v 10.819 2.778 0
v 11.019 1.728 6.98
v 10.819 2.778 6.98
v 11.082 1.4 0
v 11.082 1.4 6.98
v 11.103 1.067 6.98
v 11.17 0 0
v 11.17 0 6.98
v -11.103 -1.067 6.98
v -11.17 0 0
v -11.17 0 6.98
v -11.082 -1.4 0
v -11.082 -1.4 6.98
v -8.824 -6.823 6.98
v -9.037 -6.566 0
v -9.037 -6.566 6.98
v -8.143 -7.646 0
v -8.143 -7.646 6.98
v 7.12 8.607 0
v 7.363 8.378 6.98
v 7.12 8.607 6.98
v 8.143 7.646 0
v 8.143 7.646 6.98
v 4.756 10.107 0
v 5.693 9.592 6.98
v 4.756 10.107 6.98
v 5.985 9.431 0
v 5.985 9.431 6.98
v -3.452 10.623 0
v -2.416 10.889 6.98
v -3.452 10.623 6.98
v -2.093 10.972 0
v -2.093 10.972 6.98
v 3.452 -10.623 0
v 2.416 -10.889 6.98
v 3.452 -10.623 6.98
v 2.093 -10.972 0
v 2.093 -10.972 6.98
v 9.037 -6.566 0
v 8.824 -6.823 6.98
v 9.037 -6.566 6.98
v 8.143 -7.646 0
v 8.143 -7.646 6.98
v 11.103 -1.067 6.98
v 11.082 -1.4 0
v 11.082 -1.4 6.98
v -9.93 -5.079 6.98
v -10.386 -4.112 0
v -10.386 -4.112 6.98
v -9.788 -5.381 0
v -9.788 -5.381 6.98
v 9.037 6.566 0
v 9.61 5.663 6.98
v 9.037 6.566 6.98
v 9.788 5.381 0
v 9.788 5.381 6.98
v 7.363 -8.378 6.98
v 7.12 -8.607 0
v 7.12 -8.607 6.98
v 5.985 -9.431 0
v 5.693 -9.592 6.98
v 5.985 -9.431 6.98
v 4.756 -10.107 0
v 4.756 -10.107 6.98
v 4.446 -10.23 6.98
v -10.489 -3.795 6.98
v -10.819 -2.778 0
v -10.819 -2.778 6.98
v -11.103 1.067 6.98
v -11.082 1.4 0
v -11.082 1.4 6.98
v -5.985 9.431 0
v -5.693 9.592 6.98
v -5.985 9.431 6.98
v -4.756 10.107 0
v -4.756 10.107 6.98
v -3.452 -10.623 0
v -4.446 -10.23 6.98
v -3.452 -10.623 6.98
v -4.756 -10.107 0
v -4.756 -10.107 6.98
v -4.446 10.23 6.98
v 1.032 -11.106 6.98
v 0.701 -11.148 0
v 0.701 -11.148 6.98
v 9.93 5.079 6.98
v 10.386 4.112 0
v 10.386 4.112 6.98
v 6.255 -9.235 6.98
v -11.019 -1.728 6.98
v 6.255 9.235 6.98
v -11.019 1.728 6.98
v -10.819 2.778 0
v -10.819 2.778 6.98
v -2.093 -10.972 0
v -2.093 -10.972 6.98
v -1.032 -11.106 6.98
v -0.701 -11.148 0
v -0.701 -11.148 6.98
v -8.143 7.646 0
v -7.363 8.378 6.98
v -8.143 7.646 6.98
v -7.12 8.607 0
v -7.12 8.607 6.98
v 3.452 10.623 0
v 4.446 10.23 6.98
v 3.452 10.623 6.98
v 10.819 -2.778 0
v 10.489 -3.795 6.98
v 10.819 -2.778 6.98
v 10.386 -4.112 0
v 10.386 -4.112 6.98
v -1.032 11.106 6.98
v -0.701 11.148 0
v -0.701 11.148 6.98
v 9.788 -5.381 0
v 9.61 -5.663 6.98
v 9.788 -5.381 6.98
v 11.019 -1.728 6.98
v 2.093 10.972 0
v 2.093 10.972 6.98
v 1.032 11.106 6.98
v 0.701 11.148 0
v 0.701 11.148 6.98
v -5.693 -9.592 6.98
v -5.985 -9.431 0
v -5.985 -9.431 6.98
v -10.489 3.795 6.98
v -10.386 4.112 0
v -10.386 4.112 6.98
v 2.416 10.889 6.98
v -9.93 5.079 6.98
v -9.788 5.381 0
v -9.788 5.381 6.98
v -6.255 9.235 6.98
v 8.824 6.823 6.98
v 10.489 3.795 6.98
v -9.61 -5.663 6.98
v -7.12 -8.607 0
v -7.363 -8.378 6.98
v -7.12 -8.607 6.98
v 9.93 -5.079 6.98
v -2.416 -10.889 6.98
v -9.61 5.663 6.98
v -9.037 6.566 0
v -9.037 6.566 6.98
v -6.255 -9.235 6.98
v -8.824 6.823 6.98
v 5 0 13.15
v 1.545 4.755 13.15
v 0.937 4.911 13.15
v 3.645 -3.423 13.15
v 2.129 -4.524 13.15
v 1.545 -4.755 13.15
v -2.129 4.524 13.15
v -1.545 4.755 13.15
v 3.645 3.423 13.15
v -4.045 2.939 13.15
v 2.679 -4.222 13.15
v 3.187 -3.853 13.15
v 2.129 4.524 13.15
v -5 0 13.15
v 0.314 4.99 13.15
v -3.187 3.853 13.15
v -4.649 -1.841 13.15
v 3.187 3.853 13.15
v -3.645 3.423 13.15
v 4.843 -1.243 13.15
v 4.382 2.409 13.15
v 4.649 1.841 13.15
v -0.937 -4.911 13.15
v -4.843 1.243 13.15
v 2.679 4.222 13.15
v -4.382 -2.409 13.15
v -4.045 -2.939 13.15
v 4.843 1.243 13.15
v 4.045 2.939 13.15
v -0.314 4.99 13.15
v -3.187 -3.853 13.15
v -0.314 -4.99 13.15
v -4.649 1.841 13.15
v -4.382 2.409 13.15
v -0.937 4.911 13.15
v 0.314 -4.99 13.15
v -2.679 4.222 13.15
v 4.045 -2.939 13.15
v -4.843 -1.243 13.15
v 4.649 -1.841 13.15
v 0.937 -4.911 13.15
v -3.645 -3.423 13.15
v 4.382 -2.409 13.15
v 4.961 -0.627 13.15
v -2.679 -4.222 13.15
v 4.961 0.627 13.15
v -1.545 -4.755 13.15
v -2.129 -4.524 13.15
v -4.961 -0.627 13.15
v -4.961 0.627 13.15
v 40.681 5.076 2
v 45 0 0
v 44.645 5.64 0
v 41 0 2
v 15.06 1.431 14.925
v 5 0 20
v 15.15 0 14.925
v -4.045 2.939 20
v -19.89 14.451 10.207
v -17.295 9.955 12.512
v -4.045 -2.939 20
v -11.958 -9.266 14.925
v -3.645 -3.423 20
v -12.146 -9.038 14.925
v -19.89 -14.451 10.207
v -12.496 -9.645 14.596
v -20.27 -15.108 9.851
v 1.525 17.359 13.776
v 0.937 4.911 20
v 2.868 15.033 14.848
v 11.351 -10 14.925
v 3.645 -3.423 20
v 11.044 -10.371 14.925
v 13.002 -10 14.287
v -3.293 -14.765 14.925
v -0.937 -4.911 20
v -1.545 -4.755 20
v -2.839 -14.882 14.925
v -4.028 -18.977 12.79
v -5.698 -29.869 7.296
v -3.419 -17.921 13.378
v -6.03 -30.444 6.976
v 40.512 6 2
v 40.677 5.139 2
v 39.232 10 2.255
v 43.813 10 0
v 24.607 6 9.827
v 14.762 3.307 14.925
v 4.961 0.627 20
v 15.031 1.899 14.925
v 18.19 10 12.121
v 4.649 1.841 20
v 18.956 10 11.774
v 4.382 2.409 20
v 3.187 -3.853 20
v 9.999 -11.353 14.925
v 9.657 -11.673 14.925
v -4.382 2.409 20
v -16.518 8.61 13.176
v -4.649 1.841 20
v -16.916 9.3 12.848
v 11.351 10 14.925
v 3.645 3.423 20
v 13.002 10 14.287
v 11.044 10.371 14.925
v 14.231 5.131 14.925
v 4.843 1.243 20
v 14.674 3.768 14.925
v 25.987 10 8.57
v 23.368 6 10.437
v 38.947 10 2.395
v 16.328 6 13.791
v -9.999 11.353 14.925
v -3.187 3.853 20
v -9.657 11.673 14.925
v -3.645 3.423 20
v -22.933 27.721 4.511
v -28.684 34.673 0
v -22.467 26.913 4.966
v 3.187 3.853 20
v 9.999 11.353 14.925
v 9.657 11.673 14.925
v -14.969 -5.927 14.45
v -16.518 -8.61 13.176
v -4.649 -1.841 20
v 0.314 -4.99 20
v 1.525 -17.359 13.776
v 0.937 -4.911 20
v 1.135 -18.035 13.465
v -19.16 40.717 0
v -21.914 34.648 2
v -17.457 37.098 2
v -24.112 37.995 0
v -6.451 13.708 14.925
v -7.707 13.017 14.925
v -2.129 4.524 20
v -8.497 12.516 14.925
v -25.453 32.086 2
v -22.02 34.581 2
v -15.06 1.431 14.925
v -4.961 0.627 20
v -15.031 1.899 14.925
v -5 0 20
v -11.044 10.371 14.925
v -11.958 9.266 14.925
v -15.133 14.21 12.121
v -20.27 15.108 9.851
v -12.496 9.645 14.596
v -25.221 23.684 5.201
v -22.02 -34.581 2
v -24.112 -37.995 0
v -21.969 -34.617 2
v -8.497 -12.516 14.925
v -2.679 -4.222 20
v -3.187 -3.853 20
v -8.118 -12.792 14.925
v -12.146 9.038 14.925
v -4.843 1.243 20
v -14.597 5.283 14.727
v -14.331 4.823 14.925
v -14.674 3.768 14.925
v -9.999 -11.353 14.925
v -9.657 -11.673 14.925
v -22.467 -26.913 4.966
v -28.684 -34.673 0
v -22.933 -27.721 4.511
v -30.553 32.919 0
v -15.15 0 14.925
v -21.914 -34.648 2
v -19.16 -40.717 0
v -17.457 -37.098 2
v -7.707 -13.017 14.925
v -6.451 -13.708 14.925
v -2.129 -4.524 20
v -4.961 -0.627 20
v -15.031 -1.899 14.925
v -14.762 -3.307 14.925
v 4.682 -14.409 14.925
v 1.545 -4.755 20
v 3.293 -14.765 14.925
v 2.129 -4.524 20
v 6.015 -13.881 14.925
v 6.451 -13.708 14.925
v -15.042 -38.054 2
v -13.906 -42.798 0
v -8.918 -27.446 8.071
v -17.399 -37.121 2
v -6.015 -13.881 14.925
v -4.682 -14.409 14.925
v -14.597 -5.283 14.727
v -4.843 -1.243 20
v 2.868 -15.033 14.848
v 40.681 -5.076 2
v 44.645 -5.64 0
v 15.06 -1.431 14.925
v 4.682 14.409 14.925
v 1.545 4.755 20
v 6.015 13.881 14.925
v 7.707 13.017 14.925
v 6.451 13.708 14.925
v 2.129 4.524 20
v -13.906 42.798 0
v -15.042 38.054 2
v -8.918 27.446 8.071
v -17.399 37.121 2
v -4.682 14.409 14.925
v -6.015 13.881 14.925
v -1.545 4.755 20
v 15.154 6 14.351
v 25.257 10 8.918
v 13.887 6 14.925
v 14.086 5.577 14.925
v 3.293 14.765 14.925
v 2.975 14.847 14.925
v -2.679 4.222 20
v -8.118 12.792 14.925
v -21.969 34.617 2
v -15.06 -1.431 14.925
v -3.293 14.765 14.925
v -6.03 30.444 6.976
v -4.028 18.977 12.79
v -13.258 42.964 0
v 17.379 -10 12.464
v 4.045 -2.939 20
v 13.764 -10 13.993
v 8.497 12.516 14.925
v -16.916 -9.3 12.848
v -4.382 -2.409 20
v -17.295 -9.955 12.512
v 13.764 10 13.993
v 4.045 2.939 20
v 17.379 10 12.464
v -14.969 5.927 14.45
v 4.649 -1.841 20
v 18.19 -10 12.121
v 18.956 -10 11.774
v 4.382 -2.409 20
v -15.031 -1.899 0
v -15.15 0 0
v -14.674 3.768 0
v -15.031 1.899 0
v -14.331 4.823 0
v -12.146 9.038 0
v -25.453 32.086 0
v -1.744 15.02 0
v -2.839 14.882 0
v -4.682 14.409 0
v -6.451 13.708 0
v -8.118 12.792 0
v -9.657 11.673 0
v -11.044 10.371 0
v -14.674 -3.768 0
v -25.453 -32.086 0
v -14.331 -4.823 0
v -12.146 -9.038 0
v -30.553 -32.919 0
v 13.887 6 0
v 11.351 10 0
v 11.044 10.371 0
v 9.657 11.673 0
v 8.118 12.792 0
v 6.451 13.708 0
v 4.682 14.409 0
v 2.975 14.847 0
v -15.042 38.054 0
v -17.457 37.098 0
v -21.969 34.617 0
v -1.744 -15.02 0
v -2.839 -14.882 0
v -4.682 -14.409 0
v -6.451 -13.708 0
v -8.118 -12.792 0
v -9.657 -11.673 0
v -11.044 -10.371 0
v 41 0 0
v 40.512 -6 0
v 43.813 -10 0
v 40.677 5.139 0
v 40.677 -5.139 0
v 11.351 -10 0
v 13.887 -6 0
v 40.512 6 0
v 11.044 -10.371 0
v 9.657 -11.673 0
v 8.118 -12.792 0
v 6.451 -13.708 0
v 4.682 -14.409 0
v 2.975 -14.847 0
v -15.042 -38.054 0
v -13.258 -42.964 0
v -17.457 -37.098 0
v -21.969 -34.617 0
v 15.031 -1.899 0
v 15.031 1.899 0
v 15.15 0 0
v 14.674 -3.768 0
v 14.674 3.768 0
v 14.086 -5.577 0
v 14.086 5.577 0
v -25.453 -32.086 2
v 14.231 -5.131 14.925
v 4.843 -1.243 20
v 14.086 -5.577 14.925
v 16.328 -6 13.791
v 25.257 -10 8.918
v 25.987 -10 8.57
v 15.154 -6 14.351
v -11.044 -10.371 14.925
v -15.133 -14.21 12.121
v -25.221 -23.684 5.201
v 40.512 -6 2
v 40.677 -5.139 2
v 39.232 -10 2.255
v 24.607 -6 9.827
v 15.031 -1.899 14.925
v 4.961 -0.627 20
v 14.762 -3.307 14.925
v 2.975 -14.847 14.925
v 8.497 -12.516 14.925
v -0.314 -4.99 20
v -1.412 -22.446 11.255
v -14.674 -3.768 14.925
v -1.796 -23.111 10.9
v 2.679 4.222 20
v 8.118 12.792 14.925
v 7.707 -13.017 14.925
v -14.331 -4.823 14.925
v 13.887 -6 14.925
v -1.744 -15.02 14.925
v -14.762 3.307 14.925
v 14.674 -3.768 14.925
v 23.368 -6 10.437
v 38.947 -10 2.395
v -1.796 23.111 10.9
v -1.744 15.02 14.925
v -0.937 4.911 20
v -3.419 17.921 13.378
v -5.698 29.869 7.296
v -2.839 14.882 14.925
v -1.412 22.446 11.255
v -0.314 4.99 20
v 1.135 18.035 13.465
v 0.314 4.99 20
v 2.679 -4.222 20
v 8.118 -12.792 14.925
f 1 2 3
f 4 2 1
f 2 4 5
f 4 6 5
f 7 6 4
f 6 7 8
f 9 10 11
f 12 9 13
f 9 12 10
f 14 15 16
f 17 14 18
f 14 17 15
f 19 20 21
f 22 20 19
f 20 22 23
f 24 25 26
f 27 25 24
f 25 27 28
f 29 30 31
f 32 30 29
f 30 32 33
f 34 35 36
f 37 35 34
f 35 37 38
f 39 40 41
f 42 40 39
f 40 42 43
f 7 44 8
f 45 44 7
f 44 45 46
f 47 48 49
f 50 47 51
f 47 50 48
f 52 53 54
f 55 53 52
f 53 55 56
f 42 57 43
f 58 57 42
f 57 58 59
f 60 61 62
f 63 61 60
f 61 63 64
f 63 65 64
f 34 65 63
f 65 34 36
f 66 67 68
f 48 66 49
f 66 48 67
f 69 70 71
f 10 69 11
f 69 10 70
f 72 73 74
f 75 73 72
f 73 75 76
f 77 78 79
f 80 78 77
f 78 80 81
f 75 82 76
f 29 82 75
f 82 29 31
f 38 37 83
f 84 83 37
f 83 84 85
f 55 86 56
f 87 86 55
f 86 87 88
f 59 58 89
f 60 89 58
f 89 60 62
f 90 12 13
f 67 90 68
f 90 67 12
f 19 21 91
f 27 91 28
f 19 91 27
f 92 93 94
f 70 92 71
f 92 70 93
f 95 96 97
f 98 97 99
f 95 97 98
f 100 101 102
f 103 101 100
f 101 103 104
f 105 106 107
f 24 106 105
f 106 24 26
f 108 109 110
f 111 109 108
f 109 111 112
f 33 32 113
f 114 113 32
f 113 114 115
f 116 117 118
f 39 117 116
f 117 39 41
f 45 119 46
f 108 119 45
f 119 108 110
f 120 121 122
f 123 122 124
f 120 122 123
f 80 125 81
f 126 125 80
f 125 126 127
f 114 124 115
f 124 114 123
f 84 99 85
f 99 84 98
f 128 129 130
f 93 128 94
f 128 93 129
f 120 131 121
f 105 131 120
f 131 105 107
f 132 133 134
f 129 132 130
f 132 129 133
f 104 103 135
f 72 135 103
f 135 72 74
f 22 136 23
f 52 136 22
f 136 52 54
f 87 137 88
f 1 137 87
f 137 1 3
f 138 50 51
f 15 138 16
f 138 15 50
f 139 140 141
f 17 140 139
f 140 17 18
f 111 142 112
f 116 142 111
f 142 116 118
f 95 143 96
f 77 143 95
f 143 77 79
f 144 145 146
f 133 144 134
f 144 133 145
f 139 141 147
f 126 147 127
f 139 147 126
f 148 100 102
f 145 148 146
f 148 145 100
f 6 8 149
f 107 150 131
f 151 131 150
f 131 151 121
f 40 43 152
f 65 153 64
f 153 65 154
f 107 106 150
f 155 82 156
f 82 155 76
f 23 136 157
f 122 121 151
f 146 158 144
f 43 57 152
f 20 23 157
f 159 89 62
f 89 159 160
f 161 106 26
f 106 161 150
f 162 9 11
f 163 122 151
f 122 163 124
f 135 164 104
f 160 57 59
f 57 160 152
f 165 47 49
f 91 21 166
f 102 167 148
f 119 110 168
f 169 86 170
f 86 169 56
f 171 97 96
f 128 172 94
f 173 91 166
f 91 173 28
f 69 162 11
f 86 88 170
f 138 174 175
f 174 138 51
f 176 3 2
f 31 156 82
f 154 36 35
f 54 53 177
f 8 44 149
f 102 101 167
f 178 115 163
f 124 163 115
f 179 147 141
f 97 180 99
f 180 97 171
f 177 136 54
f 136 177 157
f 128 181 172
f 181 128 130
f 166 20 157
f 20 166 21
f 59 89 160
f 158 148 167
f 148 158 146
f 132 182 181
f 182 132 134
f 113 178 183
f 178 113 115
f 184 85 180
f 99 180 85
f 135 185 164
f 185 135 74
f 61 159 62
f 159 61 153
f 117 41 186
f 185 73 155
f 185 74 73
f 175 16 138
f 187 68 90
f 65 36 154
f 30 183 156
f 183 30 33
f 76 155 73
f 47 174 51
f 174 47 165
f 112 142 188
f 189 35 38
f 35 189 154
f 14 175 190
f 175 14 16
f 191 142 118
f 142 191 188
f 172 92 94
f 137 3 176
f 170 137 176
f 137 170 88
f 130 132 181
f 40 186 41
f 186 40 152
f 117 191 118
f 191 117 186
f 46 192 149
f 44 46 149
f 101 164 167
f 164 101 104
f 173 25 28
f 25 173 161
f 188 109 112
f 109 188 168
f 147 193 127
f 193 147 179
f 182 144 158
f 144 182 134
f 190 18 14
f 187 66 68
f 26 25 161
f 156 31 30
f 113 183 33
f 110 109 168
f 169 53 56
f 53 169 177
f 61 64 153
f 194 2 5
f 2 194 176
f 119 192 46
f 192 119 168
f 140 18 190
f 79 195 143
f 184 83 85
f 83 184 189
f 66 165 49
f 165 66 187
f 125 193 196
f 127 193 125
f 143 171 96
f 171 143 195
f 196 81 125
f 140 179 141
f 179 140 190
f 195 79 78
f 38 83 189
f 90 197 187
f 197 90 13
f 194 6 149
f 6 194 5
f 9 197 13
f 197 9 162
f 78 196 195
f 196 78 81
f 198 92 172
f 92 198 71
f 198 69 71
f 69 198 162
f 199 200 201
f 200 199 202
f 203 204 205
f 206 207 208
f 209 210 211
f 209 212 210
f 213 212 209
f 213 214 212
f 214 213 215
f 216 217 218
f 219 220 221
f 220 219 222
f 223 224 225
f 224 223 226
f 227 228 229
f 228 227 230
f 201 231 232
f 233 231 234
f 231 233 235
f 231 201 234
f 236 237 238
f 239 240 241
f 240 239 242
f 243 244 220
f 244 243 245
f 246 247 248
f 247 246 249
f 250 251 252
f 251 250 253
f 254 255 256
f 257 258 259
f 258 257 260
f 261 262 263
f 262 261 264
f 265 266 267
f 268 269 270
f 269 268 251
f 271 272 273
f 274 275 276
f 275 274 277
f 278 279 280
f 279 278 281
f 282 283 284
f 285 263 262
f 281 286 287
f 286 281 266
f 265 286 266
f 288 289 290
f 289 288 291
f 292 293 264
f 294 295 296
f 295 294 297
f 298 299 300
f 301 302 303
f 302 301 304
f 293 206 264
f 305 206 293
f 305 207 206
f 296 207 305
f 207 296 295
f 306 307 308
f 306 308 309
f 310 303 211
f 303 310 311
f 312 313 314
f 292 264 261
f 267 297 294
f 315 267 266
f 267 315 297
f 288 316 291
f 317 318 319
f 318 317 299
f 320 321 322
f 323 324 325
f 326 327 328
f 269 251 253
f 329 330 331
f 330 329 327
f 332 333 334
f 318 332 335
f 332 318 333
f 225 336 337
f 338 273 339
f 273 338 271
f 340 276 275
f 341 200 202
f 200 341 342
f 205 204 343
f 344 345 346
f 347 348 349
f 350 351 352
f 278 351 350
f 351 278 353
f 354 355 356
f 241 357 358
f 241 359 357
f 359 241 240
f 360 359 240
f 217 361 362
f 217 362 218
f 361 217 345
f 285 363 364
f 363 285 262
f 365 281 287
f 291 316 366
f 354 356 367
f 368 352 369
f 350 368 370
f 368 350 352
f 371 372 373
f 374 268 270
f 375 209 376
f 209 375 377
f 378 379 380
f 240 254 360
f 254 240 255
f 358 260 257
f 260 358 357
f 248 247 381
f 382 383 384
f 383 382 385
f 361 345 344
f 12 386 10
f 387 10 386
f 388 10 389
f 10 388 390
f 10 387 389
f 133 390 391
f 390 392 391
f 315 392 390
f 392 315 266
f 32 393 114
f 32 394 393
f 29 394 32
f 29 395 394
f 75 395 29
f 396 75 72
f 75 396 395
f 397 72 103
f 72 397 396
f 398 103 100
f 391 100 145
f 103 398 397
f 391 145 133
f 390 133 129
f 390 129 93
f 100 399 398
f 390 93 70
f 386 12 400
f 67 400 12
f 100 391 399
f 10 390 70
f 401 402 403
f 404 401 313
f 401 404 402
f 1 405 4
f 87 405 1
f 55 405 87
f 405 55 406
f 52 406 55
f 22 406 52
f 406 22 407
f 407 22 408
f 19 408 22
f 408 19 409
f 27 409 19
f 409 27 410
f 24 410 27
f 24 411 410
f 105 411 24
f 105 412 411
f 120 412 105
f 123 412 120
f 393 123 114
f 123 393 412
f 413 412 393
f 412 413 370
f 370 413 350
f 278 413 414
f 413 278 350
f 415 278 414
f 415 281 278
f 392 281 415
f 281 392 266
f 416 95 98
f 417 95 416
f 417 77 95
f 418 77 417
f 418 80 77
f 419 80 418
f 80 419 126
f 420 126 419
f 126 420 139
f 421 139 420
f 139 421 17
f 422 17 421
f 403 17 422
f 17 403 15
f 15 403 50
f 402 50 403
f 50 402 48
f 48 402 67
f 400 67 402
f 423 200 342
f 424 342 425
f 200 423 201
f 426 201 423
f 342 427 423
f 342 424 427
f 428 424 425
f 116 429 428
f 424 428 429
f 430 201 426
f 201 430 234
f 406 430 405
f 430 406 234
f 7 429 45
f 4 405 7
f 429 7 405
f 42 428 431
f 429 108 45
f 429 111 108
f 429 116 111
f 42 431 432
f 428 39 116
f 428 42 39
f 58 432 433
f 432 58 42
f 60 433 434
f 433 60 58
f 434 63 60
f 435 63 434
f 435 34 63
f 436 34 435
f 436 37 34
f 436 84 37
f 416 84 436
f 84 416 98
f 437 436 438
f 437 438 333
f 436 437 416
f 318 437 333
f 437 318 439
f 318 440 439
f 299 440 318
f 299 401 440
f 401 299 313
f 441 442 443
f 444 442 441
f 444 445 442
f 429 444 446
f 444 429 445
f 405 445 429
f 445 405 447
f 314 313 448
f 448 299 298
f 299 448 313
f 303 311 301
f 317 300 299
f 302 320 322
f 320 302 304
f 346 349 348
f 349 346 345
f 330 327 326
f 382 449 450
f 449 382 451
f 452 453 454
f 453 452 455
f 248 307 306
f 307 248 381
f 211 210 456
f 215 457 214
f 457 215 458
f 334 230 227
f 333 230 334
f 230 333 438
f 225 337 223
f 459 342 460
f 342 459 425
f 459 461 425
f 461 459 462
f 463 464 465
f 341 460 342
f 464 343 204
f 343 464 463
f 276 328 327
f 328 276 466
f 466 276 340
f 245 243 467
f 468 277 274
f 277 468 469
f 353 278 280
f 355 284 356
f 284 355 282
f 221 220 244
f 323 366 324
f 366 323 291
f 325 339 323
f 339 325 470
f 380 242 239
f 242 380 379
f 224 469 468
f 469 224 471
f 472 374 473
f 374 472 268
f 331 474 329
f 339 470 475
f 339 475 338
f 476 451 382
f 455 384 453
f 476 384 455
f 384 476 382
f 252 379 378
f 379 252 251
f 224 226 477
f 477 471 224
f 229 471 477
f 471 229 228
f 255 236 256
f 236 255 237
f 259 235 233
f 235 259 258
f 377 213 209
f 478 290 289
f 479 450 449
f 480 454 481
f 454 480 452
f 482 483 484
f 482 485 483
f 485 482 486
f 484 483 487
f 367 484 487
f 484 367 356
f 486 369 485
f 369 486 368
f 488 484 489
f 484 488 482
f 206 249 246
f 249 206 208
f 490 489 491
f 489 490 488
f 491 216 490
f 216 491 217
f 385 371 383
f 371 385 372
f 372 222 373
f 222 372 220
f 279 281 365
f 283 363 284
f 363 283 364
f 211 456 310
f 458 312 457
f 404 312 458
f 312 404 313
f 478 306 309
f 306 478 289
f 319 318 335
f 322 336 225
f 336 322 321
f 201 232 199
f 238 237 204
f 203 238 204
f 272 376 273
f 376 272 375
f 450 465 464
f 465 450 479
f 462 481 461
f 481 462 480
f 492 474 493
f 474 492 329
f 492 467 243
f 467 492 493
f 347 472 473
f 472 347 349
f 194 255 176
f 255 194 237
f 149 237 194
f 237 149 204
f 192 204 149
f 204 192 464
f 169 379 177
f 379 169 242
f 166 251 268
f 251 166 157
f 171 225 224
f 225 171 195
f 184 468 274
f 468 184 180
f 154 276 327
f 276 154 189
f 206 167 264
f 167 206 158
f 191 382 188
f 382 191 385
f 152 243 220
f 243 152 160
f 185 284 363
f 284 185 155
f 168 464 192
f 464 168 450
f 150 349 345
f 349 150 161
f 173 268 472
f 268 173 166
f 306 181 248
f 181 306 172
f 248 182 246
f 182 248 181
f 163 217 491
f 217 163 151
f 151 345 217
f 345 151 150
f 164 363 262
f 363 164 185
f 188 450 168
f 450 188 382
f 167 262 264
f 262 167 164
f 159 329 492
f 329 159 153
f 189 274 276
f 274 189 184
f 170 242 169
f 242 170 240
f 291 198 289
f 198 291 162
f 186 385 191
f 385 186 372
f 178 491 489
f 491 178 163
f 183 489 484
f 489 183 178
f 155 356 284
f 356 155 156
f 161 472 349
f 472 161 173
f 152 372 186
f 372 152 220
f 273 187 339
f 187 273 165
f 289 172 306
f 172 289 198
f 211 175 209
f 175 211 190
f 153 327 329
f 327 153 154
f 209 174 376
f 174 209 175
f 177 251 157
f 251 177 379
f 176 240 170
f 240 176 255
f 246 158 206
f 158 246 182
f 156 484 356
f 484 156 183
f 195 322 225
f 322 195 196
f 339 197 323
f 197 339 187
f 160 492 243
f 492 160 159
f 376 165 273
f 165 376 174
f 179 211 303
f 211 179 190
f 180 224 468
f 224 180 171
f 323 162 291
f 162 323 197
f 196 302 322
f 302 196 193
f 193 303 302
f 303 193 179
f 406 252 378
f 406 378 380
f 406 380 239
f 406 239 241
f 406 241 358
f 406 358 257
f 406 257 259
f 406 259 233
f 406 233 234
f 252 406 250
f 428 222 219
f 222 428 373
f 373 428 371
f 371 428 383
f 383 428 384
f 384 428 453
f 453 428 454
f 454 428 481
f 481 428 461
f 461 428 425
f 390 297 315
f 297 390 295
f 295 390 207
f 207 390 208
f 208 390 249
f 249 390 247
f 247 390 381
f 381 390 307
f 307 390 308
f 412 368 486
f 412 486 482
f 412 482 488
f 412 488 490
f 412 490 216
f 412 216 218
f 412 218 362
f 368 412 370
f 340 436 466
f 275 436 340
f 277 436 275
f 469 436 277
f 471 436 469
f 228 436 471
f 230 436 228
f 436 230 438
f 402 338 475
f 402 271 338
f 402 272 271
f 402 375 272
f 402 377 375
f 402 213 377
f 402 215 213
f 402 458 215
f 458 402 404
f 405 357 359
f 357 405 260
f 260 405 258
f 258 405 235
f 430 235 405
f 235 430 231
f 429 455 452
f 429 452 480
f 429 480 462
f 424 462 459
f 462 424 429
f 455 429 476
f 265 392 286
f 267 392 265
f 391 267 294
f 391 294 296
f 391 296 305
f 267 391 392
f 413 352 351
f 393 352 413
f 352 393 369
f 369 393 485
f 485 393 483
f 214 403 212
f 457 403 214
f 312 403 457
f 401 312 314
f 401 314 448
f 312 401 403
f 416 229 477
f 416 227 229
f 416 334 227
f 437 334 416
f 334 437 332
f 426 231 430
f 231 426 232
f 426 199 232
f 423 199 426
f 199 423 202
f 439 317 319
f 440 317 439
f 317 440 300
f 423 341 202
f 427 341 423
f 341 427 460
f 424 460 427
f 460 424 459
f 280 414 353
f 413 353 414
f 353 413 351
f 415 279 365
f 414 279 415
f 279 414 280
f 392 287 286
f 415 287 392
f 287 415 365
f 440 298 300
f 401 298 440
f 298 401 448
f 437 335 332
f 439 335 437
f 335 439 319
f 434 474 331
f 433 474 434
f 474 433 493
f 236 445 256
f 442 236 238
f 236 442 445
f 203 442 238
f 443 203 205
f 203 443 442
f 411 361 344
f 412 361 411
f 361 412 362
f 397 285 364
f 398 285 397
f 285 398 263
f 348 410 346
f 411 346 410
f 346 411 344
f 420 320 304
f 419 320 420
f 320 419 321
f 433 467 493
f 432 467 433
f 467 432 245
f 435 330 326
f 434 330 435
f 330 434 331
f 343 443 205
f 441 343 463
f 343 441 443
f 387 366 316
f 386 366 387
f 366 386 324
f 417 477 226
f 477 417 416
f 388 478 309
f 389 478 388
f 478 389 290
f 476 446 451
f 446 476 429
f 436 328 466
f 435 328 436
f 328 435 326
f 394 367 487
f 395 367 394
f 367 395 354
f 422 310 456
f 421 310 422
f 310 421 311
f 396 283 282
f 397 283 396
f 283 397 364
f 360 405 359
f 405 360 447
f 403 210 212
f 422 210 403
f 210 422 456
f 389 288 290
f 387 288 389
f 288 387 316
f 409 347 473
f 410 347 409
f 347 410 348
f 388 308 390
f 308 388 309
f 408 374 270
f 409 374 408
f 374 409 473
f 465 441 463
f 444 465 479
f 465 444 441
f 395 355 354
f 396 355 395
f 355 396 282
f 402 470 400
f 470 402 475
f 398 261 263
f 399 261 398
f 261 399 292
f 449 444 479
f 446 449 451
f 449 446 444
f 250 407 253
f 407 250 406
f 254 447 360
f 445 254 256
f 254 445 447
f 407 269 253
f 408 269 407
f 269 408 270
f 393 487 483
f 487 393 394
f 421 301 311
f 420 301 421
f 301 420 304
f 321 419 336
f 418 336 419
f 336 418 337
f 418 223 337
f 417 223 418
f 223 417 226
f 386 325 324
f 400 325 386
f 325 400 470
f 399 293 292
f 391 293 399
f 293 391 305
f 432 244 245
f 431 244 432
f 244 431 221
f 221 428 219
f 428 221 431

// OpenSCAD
r = 45; h = 20; w = 20;

br = 11.15; bh = 7; ir = 5;
t = 4; e = 0.02; $fn = 50;
  
intersection() {
  difference() {
    cylinder(r1=r, r2=ir, h=h);
    translate([0,0,-e]) intersection() {
      cylinder(r=br+e, h=h+e);
      cylinder(r1=br+bh+e, r2=ir, h=br+bh-ir+e);
    }
    cylinder(r=ir, h=h+e);
  }

  union() {
    difference() {
      union() {
        translate([0,-w/2,0]) cube([r+e,w,h]);
        rotate(120) translate([0,-w/2,0]) cube([r+e,w,h]);
        rotate(240) translate([0,-w/2,0]) cube([r+e,w,h]);
      }
      intersection() {
        union() {
          translate([-e,-w/2+t,-e]) cube([r+e,w-2*t,h+2*e]);
          rotate(120) translate([-e,-w/2+t,-e]) cube([r+e,w-2*t,h+2*e]);
          rotate(240) translate([-e,-w/2+t,-e]) cube([r+e,w-2*t,h+2*e]);
        }
        translate([0,0,-e]) cylinder(r=r-t, h=h+2*e);
      }
    }
    cylinder(r=br+t, h=h);
  } 
}
